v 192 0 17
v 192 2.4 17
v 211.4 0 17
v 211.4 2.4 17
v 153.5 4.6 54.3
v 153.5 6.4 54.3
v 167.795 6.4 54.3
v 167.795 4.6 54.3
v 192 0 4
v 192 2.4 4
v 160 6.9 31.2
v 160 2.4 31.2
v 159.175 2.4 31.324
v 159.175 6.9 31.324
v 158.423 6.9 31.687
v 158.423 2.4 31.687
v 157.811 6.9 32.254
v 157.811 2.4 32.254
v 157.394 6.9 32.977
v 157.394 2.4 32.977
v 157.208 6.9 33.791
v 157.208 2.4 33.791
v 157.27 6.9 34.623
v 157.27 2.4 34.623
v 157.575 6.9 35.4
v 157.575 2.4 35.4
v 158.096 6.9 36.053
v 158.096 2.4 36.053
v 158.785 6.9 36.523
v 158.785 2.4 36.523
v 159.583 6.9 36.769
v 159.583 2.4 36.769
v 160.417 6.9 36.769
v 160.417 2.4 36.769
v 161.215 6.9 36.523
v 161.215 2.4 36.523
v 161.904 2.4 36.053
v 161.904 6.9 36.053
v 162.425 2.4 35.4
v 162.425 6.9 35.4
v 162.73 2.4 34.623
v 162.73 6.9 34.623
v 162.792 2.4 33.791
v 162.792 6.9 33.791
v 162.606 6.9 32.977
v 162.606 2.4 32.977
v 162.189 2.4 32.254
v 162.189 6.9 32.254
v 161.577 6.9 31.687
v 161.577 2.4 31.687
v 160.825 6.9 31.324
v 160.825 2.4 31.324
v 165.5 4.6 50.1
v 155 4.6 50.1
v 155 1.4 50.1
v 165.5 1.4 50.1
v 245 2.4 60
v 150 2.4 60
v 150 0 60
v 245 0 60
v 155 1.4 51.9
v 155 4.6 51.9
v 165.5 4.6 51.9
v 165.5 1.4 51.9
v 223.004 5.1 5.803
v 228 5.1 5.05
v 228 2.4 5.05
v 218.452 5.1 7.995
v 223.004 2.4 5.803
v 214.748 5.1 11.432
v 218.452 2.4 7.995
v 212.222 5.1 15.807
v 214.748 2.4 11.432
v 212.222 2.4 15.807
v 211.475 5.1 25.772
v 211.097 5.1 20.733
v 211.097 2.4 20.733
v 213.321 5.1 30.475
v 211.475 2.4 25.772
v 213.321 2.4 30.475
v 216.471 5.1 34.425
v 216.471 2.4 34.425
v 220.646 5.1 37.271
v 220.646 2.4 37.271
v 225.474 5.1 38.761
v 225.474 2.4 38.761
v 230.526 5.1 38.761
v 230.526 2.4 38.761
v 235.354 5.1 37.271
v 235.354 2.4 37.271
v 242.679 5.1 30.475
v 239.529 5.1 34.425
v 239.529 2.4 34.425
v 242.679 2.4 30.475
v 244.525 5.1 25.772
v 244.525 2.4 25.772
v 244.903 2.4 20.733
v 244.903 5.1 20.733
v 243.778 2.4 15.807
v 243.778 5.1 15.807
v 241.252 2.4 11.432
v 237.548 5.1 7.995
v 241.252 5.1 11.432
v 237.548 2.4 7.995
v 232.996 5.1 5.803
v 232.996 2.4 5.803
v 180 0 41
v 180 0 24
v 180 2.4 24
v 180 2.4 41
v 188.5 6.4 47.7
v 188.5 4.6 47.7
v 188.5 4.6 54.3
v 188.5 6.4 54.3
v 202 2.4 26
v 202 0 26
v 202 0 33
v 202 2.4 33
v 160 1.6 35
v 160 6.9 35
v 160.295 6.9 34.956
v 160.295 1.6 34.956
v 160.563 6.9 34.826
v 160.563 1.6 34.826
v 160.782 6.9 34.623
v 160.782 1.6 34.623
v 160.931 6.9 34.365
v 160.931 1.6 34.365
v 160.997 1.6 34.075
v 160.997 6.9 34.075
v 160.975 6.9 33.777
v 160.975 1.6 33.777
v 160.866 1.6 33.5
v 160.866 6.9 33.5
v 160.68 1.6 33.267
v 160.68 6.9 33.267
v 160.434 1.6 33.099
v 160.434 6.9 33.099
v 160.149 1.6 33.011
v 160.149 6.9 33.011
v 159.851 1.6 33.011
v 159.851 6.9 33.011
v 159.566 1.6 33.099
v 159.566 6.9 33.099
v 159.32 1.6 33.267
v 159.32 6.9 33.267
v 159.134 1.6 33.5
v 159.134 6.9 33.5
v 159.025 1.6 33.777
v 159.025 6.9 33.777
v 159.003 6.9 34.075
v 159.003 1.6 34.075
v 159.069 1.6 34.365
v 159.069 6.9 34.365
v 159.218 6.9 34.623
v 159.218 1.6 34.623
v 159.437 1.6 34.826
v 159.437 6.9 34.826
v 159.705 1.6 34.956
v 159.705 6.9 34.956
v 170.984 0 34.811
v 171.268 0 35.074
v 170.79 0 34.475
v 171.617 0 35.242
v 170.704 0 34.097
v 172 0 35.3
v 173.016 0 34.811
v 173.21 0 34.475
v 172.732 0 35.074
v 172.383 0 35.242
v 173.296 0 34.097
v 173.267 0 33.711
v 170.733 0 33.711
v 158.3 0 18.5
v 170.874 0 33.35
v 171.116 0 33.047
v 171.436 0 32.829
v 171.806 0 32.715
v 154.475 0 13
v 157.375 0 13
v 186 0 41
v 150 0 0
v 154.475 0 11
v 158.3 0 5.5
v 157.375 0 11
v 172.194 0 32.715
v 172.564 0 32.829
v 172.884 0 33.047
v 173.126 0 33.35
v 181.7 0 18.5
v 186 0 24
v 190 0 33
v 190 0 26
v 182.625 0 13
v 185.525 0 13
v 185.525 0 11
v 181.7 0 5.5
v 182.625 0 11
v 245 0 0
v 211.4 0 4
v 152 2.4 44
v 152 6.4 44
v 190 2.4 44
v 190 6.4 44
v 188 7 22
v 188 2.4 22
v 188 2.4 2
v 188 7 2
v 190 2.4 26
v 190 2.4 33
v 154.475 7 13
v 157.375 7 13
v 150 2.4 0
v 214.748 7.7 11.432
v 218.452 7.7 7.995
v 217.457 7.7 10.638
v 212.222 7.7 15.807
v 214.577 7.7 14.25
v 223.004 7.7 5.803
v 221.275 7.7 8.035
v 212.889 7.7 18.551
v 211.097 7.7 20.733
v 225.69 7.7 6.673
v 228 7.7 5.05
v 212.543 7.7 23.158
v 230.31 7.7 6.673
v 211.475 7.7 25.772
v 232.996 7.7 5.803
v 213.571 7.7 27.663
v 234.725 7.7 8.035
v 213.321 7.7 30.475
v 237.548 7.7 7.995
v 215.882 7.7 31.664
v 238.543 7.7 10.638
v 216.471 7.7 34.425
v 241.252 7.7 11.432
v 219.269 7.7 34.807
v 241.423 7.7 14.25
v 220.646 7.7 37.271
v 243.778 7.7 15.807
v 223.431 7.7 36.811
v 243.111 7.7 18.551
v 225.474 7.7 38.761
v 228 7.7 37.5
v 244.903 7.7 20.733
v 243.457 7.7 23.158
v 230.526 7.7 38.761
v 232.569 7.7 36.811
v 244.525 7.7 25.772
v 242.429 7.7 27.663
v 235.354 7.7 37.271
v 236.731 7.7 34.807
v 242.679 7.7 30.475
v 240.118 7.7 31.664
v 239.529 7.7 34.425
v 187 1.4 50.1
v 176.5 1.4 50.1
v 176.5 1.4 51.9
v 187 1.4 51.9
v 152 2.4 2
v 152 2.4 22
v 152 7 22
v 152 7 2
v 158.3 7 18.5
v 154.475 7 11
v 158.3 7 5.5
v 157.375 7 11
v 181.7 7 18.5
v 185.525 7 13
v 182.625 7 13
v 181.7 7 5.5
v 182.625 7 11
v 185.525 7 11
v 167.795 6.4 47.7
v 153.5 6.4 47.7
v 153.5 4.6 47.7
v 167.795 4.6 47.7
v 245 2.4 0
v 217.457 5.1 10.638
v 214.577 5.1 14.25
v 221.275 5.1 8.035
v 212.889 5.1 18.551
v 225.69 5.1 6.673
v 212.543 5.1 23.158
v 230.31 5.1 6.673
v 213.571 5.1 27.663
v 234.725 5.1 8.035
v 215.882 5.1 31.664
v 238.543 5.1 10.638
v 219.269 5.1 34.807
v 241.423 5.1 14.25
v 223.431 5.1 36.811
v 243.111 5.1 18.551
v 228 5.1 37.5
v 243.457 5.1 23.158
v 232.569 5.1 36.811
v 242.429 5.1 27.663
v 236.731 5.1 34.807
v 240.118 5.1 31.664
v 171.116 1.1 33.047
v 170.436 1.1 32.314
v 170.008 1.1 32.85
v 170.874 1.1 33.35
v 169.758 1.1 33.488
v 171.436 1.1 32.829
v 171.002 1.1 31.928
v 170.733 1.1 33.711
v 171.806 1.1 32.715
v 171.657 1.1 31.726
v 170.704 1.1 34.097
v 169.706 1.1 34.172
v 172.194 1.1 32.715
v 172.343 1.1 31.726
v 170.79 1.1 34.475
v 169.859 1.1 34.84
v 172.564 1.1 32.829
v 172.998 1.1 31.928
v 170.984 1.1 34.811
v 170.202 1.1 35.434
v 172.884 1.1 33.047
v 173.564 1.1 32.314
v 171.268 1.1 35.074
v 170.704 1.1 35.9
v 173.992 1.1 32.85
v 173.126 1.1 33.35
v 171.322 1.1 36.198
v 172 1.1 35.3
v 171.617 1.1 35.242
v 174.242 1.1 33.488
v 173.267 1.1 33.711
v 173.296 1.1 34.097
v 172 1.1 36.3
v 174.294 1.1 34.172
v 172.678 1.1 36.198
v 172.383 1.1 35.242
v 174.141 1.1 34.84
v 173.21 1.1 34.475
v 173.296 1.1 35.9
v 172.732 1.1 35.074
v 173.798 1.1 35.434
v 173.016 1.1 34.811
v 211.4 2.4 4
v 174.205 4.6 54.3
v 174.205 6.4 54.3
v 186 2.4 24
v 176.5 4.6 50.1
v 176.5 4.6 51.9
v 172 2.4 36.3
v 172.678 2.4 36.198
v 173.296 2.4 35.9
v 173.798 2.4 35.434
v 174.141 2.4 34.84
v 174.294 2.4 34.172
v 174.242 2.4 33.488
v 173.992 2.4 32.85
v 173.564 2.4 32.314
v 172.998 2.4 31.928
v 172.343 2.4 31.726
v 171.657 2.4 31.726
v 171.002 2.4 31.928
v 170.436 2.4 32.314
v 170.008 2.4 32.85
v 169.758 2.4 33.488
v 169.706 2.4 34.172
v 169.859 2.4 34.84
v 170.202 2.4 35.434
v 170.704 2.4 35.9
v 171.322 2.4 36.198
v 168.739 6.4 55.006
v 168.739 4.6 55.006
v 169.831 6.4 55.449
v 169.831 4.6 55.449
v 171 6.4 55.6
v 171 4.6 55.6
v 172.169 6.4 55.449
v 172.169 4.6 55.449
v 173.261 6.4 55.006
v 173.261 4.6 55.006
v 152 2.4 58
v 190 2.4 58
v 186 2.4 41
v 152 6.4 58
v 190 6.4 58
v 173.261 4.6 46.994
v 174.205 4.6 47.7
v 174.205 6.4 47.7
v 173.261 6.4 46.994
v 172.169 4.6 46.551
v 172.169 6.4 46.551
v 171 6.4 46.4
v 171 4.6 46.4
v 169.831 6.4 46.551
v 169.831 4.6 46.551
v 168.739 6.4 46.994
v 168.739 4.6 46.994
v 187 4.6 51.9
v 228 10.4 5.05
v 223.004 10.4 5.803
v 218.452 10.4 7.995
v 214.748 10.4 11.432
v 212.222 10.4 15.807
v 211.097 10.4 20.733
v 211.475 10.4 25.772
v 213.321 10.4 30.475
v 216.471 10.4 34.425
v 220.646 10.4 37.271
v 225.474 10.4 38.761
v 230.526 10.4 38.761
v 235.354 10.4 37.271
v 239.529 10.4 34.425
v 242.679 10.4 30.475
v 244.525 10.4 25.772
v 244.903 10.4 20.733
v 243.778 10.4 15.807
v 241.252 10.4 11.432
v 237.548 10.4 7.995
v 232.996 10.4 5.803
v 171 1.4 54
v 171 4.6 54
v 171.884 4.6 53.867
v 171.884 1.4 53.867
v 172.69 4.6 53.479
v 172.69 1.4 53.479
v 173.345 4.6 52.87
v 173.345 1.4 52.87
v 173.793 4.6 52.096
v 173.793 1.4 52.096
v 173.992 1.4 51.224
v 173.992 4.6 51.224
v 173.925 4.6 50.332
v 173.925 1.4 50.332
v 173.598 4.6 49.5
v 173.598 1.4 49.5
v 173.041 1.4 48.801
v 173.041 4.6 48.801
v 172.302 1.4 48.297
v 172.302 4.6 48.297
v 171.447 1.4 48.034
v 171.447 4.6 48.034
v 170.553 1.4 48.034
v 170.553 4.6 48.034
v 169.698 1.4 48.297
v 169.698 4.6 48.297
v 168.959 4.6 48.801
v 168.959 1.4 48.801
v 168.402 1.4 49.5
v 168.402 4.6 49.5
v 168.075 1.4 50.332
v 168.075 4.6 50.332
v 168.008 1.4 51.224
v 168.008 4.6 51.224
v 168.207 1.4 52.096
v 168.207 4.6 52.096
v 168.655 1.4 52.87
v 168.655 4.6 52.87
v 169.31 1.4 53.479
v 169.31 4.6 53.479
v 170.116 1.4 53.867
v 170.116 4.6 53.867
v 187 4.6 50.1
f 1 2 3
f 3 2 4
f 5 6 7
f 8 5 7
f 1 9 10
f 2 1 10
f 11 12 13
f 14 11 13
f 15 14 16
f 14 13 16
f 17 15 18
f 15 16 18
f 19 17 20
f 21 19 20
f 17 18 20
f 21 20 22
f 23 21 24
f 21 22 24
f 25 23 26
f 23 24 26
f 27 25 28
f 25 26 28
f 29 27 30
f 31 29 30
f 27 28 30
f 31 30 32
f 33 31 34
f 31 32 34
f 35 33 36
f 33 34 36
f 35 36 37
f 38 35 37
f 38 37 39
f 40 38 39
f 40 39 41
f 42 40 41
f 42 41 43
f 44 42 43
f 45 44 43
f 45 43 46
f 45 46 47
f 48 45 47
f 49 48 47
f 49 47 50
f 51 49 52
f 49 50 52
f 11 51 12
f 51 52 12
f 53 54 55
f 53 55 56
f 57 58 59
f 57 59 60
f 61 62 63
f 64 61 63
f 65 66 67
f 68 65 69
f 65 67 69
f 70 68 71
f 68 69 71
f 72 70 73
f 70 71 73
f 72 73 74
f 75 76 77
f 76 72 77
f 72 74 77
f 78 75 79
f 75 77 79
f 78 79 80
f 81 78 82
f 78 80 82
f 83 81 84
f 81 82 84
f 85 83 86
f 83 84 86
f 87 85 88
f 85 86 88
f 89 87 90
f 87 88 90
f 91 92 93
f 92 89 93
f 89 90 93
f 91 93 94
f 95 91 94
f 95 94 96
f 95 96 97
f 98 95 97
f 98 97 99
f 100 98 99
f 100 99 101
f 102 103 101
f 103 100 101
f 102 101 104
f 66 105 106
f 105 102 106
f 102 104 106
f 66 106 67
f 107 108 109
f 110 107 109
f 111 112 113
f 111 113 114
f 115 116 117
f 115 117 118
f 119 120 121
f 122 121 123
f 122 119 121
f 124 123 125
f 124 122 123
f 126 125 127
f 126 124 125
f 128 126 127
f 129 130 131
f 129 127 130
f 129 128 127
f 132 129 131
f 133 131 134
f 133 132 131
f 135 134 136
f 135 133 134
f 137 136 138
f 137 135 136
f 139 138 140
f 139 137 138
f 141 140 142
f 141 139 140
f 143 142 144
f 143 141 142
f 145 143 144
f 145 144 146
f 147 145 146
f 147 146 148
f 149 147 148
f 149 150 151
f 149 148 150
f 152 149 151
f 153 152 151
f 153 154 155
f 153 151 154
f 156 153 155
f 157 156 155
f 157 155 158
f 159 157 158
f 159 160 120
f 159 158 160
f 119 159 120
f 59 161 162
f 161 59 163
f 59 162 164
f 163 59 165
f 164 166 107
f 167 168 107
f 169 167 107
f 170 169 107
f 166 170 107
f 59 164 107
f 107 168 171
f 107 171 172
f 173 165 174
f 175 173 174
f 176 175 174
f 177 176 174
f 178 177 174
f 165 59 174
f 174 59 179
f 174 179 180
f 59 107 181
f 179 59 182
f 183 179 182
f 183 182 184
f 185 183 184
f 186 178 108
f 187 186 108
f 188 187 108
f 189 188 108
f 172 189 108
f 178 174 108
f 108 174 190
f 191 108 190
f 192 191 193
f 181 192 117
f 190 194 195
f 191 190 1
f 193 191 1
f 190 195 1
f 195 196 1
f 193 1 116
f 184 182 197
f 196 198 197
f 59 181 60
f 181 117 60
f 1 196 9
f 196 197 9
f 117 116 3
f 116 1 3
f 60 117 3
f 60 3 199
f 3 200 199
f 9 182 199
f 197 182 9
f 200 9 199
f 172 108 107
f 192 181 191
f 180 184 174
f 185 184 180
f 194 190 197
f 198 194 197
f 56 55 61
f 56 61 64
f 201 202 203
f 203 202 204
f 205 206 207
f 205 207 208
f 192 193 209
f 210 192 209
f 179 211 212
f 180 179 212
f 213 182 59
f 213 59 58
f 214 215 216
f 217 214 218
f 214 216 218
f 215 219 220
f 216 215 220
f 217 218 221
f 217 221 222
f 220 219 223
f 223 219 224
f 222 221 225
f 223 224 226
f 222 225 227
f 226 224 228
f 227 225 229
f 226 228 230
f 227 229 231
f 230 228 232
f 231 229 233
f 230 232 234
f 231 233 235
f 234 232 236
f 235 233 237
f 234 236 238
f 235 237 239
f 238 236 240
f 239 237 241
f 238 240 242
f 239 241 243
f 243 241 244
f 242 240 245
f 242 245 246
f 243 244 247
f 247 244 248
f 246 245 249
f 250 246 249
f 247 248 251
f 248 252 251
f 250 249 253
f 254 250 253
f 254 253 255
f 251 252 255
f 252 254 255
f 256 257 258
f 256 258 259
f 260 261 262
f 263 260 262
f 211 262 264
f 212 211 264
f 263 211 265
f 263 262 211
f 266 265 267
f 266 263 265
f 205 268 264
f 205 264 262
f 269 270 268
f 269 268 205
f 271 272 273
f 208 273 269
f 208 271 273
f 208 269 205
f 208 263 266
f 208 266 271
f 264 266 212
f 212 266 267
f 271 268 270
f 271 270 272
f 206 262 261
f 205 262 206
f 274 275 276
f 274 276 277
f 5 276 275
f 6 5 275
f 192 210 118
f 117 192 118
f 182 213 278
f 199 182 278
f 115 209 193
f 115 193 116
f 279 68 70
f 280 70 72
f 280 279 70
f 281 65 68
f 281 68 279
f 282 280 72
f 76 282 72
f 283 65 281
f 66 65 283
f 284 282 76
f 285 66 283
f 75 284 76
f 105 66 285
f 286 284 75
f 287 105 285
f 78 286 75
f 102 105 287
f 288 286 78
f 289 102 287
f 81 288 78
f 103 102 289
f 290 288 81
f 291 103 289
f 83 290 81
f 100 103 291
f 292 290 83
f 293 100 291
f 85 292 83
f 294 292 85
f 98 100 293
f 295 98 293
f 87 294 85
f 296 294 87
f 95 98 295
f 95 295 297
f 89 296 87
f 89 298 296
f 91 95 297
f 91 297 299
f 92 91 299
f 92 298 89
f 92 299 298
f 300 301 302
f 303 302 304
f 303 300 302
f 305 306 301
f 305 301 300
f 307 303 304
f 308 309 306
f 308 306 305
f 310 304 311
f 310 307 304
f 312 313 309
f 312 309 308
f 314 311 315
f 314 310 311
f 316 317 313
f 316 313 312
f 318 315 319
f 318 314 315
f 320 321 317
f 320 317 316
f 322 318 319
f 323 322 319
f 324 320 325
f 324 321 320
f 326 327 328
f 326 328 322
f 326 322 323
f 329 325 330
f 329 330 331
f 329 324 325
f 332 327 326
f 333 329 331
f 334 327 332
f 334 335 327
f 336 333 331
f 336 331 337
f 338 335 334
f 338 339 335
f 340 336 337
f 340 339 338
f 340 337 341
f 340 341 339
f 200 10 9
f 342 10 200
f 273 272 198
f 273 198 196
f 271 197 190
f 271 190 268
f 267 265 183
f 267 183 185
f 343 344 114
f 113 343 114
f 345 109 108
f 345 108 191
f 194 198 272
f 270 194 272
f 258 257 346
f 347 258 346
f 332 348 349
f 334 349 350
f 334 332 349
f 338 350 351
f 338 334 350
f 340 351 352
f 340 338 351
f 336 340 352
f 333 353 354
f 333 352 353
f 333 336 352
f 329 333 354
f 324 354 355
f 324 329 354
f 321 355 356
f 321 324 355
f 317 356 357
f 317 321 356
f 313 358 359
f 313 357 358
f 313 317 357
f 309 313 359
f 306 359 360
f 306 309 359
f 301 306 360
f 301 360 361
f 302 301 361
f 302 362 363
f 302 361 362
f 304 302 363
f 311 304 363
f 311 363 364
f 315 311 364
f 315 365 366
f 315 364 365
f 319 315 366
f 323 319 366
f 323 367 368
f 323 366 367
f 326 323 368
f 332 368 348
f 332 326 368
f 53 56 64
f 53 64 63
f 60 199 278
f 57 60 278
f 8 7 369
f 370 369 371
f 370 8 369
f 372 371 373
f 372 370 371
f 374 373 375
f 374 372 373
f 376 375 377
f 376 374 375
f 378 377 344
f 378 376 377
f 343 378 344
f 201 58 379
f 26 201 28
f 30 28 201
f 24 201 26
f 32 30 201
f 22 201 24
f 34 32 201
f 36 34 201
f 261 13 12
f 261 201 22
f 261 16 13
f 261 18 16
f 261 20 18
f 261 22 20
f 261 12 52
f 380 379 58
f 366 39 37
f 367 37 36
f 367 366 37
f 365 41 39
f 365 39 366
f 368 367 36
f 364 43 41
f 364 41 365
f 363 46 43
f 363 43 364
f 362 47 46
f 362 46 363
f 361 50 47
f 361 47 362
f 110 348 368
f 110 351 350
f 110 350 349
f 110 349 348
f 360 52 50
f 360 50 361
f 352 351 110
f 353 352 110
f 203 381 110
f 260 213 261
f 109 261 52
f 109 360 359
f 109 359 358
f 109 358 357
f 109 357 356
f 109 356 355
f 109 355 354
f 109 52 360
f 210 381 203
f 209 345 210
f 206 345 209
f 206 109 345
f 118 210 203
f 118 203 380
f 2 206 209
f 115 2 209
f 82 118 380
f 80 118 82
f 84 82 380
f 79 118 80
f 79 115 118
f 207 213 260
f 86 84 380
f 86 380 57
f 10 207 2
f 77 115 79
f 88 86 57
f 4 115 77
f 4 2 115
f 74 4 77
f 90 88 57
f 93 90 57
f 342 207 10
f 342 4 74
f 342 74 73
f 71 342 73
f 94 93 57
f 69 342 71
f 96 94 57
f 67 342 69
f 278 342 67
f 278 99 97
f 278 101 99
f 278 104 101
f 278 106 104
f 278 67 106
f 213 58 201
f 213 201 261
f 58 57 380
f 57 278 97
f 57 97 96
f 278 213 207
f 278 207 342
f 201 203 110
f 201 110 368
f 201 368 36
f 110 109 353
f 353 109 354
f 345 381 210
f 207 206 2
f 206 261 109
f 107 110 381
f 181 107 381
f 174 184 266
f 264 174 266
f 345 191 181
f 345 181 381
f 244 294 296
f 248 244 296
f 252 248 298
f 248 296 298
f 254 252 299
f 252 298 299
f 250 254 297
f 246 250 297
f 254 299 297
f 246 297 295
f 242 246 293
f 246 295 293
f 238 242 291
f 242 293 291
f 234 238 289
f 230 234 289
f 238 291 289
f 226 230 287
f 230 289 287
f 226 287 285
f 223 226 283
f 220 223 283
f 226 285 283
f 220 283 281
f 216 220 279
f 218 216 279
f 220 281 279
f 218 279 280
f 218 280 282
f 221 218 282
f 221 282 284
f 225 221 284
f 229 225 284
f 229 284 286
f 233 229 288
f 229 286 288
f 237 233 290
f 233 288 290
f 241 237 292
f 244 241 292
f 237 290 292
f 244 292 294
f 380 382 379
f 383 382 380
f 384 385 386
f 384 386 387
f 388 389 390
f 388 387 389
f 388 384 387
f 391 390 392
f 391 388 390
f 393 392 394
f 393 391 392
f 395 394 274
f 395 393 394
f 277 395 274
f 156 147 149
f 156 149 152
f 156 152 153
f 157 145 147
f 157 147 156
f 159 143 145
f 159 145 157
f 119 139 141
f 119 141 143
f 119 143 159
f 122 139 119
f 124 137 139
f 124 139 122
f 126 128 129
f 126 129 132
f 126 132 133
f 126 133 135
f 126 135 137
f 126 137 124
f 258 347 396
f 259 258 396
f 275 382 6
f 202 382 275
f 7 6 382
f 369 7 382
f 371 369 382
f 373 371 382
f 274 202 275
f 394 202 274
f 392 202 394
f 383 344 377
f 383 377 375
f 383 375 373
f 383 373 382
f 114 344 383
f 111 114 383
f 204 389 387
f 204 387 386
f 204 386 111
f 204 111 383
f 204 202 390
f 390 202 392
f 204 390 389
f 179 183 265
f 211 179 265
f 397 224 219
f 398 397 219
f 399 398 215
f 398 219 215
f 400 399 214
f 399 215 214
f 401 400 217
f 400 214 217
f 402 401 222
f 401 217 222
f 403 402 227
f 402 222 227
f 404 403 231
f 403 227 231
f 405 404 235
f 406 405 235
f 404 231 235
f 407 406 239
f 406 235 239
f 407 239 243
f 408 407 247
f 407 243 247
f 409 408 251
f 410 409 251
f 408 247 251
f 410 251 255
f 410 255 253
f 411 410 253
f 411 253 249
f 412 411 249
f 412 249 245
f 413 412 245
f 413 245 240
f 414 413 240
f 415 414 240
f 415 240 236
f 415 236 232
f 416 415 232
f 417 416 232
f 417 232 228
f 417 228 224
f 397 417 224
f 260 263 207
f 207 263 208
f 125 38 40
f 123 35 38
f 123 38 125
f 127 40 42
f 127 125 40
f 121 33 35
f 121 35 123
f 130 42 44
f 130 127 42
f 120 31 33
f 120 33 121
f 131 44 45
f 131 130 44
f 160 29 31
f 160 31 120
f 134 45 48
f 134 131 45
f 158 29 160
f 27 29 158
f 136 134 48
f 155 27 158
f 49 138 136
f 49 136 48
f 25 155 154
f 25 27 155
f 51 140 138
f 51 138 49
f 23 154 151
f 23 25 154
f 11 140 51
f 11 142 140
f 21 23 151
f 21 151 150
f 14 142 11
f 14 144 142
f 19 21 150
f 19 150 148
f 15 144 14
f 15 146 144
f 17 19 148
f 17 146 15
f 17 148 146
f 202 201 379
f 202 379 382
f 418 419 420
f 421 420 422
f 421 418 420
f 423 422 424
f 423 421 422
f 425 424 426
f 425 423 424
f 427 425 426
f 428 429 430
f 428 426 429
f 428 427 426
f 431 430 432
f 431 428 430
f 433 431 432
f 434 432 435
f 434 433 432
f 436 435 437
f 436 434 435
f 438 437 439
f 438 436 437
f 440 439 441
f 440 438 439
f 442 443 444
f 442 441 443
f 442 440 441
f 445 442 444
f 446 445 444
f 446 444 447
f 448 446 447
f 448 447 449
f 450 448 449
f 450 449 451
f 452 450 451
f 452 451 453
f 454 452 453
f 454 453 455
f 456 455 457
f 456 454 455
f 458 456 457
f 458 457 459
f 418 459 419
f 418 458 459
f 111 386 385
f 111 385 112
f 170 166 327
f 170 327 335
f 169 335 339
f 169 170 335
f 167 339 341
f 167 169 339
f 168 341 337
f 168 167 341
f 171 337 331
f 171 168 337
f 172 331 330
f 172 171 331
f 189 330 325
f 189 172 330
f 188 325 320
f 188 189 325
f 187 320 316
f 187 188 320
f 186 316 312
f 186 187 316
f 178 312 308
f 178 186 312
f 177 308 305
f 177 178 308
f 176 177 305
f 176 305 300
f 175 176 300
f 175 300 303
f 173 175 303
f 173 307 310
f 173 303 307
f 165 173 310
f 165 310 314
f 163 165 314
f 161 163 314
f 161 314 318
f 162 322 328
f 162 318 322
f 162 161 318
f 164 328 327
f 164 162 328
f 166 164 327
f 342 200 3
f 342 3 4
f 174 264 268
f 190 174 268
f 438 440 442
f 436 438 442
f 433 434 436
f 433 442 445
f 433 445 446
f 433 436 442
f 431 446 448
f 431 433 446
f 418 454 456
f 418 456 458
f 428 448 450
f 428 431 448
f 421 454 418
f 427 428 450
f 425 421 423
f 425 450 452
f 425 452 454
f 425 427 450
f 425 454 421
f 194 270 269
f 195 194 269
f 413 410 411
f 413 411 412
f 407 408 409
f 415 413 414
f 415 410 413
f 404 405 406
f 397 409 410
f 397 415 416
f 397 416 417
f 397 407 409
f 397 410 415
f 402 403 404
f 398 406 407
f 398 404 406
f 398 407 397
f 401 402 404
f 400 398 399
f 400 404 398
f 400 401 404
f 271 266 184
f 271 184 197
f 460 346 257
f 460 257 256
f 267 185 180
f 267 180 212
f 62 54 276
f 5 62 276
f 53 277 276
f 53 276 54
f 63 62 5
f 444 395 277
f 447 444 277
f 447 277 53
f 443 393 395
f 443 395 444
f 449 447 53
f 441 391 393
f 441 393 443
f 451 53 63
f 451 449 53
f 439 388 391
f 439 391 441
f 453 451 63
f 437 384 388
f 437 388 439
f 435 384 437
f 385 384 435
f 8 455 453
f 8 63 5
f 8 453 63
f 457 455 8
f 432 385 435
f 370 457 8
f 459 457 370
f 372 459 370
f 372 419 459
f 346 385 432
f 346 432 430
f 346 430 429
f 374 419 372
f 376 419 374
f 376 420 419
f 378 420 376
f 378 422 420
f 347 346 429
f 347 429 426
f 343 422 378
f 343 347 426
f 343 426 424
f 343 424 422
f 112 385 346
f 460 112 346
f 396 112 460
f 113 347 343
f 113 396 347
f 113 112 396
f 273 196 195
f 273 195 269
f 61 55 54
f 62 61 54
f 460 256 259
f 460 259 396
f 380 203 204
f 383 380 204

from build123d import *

# Parameters (mm, degrees)
SKETCH1_W            = 95
SKETCH1_H            = 2.4
BOSS_EXTRUDE1_DEPTH  = 60
BOSS_EXTRUDE2_START  = 2
SKETCH2_W            = 36
SKETCH2_H            = 4.6
BOSS_EXTRUDE2_DEPTH  = 20
BOSS_EXTRUDE3_START  = 5.5
SKETCH3_W            = 23.4
SKETCH3_H            = 9
BOSS_EXTRUDE3_DEPTH  = 13
BOSS_EXTRUDE4_START  = 11
SKETCH4_W            = 2.9
SKETCH4_H            = 9
BOSS_EXTRUDE4_DEPTH  = 2
BOSS_EXTRUDE5_START  = 11
SKETCH5_W            = 2.9
SKETCH5_H            = 9
BOSS_EXTRUDE5_DEPTH  = 2
BOSS_EXTRUDE6_START  = 4
SKETCH6_W            = 19.4
SKETCH6_H            = 4.4
BOSS_EXTRUDE6_DEPTH  = 13
BOSS_EXTRUDE7_START  = 2.4
SKETCH7_R            = 2.8
BOSS_EXTRUDE7_DEPTH  = 4.5
BOSS_EXTRUDE8_START  = 1.6
SKETCH8_R            = 1
BOSS_EXTRUDE8_DEPTH  = 6.3
BOSS_EXTRUDE9_START  = -1
SKETCH9_R            = 1.3
BOSS_EXTRUDE9_DEPTH  = 4.4
BOSS_EXTRUDE10_START = 1.1
SKETCH10_R           = 2.3
BOSS_EXTRUDE10_DEPTH = 2.3
BOSS_EXTRUDE11_START = 24
SKETCH11_W           = 6
SKETCH11_H           = 4.4
BOSS_EXTRUDE11_DEPTH = 17
BOSS_EXTRUDE12_START = 26
SKETCH12_W           = 12
SKETCH12_H           = 4.4
BOSS_EXTRUDE12_DEPTH = 7
BOSS_EXTRUDE13_START = 2.4
SKETCH13_R           = 16.95
BOSS_EXTRUDE13_DEPTH = 8
BOSS_EXTRUDE14_START = 5.1
SKETCH14_R           = 20
BOSS_EXTRUDE14_DEPTH = 2.6
BOSS_EXTRUDE15_START = 5.1
SKETCH15_R           = 15.5
BOSS_EXTRUDE15_DEPTH = 2.6
BOSS_EXTRUDE16_START = 44
SKETCH16_W           = 38
SKETCH16_H           = 4
BOSS_EXTRUDE16_DEPTH = 14
BOSS_EXTRUDE17_START = 4.6
SKETCH17_R           = 4.6
BOSS_EXTRUDE17_DEPTH = 2.3
BOSS_EXTRUDE18_START = 47.7
SKETCH18_W           = 17.5
SKETCH18_H           = 2.3
BOSS_EXTRUDE18_DEPTH = 6.6
BOSS_EXTRUDE19_START = 50.1
SKETCH19_W           = 10.5
SKETCH19_H           = 6
BOSS_EXTRUDE19_DEPTH = 1.8
BOSS_EXTRUDE20_START = 47.7
SKETCH20_W           = 17.5
SKETCH20_H           = 2.3
BOSS_EXTRUDE20_DEPTH = 6.6
BOSS_EXTRUDE21_START = 50.1
SKETCH21_W           = 10.5
SKETCH21_H           = 6
BOSS_EXTRUDE21_DEPTH = 1.8
BOSS_EXTRUDE22_START = 1.4
SKETCH22_R           = 3
BOSS_EXTRUDE22_DEPTH = 6


with BuildPart() as part:
    # Sketch1 → Boss-Extrude1 (new body)
    with BuildSketch(Plane.XY):
        with Locations((197.5, 1.2)):
            Rectangle(SKETCH1_W, SKETCH1_H)
    extrude(amount=BOSS_EXTRUDE1_DEPTH)

    # Sketch2 → Boss-Extrude2 (add)
    with BuildSketch(Plane.XY.offset(BOSS_EXTRUDE2_START)):
        with Locations((170, 4.7)):
            Rectangle(SKETCH2_W, SKETCH2_H)
    extrude(amount=BOSS_EXTRUDE2_DEPTH)


with BuildPart() as body_2:
    # Sketch3 → Boss-Extrude3 (new body)
    with BuildSketch(Plane.XY.offset(BOSS_EXTRUDE3_START)):
        with Locations((170, 3.5)):
            Rectangle(SKETCH3_W, SKETCH3_H)
    extrude(amount=BOSS_EXTRUDE3_DEPTH)


with BuildPart() as part_1:
    add(part.part)

    # Combine1: cut body 2
    add(body_2.part, mode=Mode.SUBTRACT)


with BuildPart() as body_2_2:
    # Sketch4 → Boss-Extrude4 (new body)
    with BuildSketch(Plane.XY.offset(BOSS_EXTRUDE4_START)):
        with Locations((155.925, 3.5)):
            Rectangle(SKETCH4_W, SKETCH4_H)
    extrude(amount=BOSS_EXTRUDE4_DEPTH)


with BuildPart() as part_2:
    add(part_1.part)

    # Combine2: cut body 2 2
    add(body_2_2.part, mode=Mode.SUBTRACT)


with BuildPart() as body_2_3:
    # Sketch5 → Boss-Extrude5 (new body)
    with BuildSketch(Plane.XY.offset(BOSS_EXTRUDE5_START)):
        with Locations((184.075, 3.5)):
            Rectangle(SKETCH5_W, SKETCH5_H)
    extrude(amount=BOSS_EXTRUDE5_DEPTH)


with BuildPart() as part_3:
    add(part_2.part)

    # Combine3: cut body 2 3
    add(body_2_3.part, mode=Mode.SUBTRACT)


with BuildPart() as body_2_4:
    # Sketch6 → Boss-Extrude6 (new body)
    with BuildSketch(Plane.XY.offset(BOSS_EXTRUDE6_START)):
        with Locations((201.7, 1.2)):
            Rectangle(SKETCH6_W, SKETCH6_H)
    extrude(amount=BOSS_EXTRUDE6_DEPTH)


with BuildPart() as part_4:
    add(part_3.part)

    # Combine4: cut body 2 4
    add(body_2_4.part, mode=Mode.SUBTRACT)

    # Sketch7 → Boss-Extrude7 (add)
    with BuildSketch(Plane(origin=(0, 0, 0), x_dir=(1, 0, 0), z_dir=(0, 1, 0)).offset(BOSS_EXTRUDE7_START)):
        with Locations((160, -34)):
            Circle(SKETCH7_R)
    extrude(amount=BOSS_EXTRUDE7_DEPTH)


with BuildPart() as body_2_5:
    # Sketch8 → Boss-Extrude8 (new body)
    with BuildSketch(Plane(origin=(0, 0, 0), x_dir=(1, 0, 0), z_dir=(0, 1, 0)).offset(BOSS_EXTRUDE8_START)):
        with Locations((160, -34)):
            Circle(SKETCH8_R)
    extrude(amount=BOSS_EXTRUDE8_DEPTH)


with BuildPart() as part_5:
    add(part_4.part)

    # Combine5: cut body 2 5
    add(body_2_5.part, mode=Mode.SUBTRACT)


with BuildPart() as body_2_6:
    # Sketch9 → Boss-Extrude9 (new body)
    with BuildSketch(Plane(origin=(0, 0, 0), x_dir=(1, 0, 0), z_dir=(0, 1, 0)).offset(BOSS_EXTRUDE9_START)):
        with Locations((172, -34)):
            Circle(SKETCH9_R)
    extrude(amount=BOSS_EXTRUDE9_DEPTH)


with BuildPart() as part_6:
    add(part_5.part)

    # Combine6: cut body 2 6
    add(body_2_6.part, mode=Mode.SUBTRACT)


with BuildPart() as body_2_7:
    # Sketch10 → Boss-Extrude10 (new body)
    with BuildSketch(Plane(origin=(0, 0, 0), x_dir=(1, 0, 0), z_dir=(0, 1, 0)).offset(BOSS_EXTRUDE10_START)):
        with Locations((172, -34)):
            Circle(SKETCH10_R)
    extrude(amount=BOSS_EXTRUDE10_DEPTH)


with BuildPart() as part_7:
    add(part_6.part)

    # Combine7: cut body 2 7
    add(body_2_7.part, mode=Mode.SUBTRACT)


with BuildPart() as body_2_8:
    # Sketch11 → Boss-Extrude11 (new body)
    with BuildSketch(Plane.XY.offset(BOSS_EXTRUDE11_START)):
        with Locations((183, 1.2)):
            Rectangle(SKETCH11_W, SKETCH11_H)
    extrude(amount=BOSS_EXTRUDE11_DEPTH)


with BuildPart() as part_8:
    add(part_7.part)

    # Combine8: cut body 2 8
    add(body_2_8.part, mode=Mode.SUBTRACT)


with BuildPart() as body_2_9:
    # Sketch12 → Boss-Extrude12 (new body)
    with BuildSketch(Plane.XY.offset(BOSS_EXTRUDE12_START)):
        with Locations((196, 1.2)):
            Rectangle(SKETCH12_W, SKETCH12_H)
    extrude(amount=BOSS_EXTRUDE12_DEPTH)


with BuildPart() as part_9:
    add(part_8.part)

    # Combine9: cut body 2 9
    add(body_2_9.part, mode=Mode.SUBTRACT)

    # Sketch13 → Boss-Extrude13 (add)
    with BuildSketch(Plane(origin=(0, 0, 0), x_dir=(1, 0, 0), z_dir=(0, 1, 0)).offset(BOSS_EXTRUDE13_START)):
        with Locations((228, -22)):
            Circle(SKETCH13_R)
    extrude(amount=BOSS_EXTRUDE13_DEPTH)


with BuildPart() as body_2_10:
    # Sketch14 → Boss-Extrude14 (new body)
    with BuildSketch(Plane(origin=(0, 0, 0), x_dir=(1, 0, 0), z_dir=(0, 1, 0)).offset(BOSS_EXTRUDE14_START)):
        with Locations((228, -22)):
            Circle(SKETCH14_R)
    extrude(amount=BOSS_EXTRUDE14_DEPTH)


with BuildPart() as part_10:
    add(part_9.part)

    # Combine10: cut body 2 10
    add(body_2_10.part, mode=Mode.SUBTRACT)

    # Sketch15 → Boss-Extrude15 (add)
    with BuildSketch(Plane(origin=(0, 0, 0), x_dir=(1, 0, 0), z_dir=(0, 1, 0)).offset(BOSS_EXTRUDE15_START)):
        with Locations((228, -22)):
            Circle(SKETCH15_R)
    extrude(amount=BOSS_EXTRUDE15_DEPTH)

    # Sketch16 → Boss-Extrude16 (add)
    with BuildSketch(Plane.XY.offset(BOSS_EXTRUDE16_START)):
        with Locations((171, 4.4)):
            Rectangle(SKETCH16_W, SKETCH16_H)
    extrude(amount=BOSS_EXTRUDE16_DEPTH)


with BuildPart() as body_2_11:
    # Sketch17 → Boss-Extrude17 (new body)
    with BuildSketch(Plane(origin=(0, 0, 0), x_dir=(1, 0, 0), z_dir=(0, 1, 0)).offset(BOSS_EXTRUDE17_START)):
        with Locations((171, -51)):
            Circle(SKETCH17_R)
    extrude(amount=BOSS_EXTRUDE17_DEPTH)


with BuildPart() as part_11:
    add(part_10.part)

    # Combine11: cut body 2 11
    add(body_2_11.part, mode=Mode.SUBTRACT)


with BuildPart() as body_2_12:
    # Sketch18 → Boss-Extrude18 (new body)
    with BuildSketch(Plane.XY.offset(BOSS_EXTRUDE18_START)):
        with Locations((179.75, 5.75)):
            Rectangle(SKETCH18_W, SKETCH18_H)
    extrude(amount=BOSS_EXTRUDE18_DEPTH)


with BuildPart() as part_12:
    add(part_11.part)

    # Combine12: cut body 2 12
    add(body_2_12.part, mode=Mode.SUBTRACT)


with BuildPart() as body_2_13:
    # Sketch19 → Boss-Extrude19 (new body)
    with BuildSketch(Plane.XY.offset(BOSS_EXTRUDE19_START)):
        with Locations((181.75, 4.4)):
            Rectangle(SKETCH19_W, SKETCH19_H)
    extrude(amount=BOSS_EXTRUDE19_DEPTH)


with BuildPart() as part_13:
    add(part_12.part)

    # Combine13: cut body 2 13
    add(body_2_13.part, mode=Mode.SUBTRACT)


with BuildPart() as body_2_14:
    # Sketch20 → Boss-Extrude20 (new body)
    with BuildSketch(Plane.XY.offset(BOSS_EXTRUDE20_START)):
        with Locations((162.25, 5.75)):
            Rectangle(SKETCH20_W, SKETCH20_H)
    extrude(amount=BOSS_EXTRUDE20_DEPTH)


with BuildPart() as part_14:
    add(part_13.part)

    # Combine14: cut body 2 14
    add(body_2_14.part, mode=Mode.SUBTRACT)


with BuildPart() as body_2_15:
    # Sketch21 → Boss-Extrude21 (new body)
    with BuildSketch(Plane.XY.offset(BOSS_EXTRUDE21_START)):
        with Locations((160.25, 4.4)):
            Rectangle(SKETCH21_W, SKETCH21_H)
    extrude(amount=BOSS_EXTRUDE21_DEPTH)


with BuildPart() as part_15:
    add(part_14.part)

    # Combine15: cut body 2 15
    add(body_2_15.part, mode=Mode.SUBTRACT)


with BuildPart() as body_2_16:
    # Sketch22 → Boss-Extrude22 (new body)
    with BuildSketch(Plane(origin=(0, 0, 0), x_dir=(1, 0, 0), z_dir=(0, 1, 0)).offset(BOSS_EXTRUDE22_START)):
        with Locations((171, -51)):
            Circle(SKETCH22_R)
    extrude(amount=BOSS_EXTRUDE22_DEPTH)


with BuildPart() as part_16:
    add(part_15.part)

    # Combine16: cut body 2 16
    add(body_2_16.part, mode=Mode.SUBTRACT)


solid = part_16.part
